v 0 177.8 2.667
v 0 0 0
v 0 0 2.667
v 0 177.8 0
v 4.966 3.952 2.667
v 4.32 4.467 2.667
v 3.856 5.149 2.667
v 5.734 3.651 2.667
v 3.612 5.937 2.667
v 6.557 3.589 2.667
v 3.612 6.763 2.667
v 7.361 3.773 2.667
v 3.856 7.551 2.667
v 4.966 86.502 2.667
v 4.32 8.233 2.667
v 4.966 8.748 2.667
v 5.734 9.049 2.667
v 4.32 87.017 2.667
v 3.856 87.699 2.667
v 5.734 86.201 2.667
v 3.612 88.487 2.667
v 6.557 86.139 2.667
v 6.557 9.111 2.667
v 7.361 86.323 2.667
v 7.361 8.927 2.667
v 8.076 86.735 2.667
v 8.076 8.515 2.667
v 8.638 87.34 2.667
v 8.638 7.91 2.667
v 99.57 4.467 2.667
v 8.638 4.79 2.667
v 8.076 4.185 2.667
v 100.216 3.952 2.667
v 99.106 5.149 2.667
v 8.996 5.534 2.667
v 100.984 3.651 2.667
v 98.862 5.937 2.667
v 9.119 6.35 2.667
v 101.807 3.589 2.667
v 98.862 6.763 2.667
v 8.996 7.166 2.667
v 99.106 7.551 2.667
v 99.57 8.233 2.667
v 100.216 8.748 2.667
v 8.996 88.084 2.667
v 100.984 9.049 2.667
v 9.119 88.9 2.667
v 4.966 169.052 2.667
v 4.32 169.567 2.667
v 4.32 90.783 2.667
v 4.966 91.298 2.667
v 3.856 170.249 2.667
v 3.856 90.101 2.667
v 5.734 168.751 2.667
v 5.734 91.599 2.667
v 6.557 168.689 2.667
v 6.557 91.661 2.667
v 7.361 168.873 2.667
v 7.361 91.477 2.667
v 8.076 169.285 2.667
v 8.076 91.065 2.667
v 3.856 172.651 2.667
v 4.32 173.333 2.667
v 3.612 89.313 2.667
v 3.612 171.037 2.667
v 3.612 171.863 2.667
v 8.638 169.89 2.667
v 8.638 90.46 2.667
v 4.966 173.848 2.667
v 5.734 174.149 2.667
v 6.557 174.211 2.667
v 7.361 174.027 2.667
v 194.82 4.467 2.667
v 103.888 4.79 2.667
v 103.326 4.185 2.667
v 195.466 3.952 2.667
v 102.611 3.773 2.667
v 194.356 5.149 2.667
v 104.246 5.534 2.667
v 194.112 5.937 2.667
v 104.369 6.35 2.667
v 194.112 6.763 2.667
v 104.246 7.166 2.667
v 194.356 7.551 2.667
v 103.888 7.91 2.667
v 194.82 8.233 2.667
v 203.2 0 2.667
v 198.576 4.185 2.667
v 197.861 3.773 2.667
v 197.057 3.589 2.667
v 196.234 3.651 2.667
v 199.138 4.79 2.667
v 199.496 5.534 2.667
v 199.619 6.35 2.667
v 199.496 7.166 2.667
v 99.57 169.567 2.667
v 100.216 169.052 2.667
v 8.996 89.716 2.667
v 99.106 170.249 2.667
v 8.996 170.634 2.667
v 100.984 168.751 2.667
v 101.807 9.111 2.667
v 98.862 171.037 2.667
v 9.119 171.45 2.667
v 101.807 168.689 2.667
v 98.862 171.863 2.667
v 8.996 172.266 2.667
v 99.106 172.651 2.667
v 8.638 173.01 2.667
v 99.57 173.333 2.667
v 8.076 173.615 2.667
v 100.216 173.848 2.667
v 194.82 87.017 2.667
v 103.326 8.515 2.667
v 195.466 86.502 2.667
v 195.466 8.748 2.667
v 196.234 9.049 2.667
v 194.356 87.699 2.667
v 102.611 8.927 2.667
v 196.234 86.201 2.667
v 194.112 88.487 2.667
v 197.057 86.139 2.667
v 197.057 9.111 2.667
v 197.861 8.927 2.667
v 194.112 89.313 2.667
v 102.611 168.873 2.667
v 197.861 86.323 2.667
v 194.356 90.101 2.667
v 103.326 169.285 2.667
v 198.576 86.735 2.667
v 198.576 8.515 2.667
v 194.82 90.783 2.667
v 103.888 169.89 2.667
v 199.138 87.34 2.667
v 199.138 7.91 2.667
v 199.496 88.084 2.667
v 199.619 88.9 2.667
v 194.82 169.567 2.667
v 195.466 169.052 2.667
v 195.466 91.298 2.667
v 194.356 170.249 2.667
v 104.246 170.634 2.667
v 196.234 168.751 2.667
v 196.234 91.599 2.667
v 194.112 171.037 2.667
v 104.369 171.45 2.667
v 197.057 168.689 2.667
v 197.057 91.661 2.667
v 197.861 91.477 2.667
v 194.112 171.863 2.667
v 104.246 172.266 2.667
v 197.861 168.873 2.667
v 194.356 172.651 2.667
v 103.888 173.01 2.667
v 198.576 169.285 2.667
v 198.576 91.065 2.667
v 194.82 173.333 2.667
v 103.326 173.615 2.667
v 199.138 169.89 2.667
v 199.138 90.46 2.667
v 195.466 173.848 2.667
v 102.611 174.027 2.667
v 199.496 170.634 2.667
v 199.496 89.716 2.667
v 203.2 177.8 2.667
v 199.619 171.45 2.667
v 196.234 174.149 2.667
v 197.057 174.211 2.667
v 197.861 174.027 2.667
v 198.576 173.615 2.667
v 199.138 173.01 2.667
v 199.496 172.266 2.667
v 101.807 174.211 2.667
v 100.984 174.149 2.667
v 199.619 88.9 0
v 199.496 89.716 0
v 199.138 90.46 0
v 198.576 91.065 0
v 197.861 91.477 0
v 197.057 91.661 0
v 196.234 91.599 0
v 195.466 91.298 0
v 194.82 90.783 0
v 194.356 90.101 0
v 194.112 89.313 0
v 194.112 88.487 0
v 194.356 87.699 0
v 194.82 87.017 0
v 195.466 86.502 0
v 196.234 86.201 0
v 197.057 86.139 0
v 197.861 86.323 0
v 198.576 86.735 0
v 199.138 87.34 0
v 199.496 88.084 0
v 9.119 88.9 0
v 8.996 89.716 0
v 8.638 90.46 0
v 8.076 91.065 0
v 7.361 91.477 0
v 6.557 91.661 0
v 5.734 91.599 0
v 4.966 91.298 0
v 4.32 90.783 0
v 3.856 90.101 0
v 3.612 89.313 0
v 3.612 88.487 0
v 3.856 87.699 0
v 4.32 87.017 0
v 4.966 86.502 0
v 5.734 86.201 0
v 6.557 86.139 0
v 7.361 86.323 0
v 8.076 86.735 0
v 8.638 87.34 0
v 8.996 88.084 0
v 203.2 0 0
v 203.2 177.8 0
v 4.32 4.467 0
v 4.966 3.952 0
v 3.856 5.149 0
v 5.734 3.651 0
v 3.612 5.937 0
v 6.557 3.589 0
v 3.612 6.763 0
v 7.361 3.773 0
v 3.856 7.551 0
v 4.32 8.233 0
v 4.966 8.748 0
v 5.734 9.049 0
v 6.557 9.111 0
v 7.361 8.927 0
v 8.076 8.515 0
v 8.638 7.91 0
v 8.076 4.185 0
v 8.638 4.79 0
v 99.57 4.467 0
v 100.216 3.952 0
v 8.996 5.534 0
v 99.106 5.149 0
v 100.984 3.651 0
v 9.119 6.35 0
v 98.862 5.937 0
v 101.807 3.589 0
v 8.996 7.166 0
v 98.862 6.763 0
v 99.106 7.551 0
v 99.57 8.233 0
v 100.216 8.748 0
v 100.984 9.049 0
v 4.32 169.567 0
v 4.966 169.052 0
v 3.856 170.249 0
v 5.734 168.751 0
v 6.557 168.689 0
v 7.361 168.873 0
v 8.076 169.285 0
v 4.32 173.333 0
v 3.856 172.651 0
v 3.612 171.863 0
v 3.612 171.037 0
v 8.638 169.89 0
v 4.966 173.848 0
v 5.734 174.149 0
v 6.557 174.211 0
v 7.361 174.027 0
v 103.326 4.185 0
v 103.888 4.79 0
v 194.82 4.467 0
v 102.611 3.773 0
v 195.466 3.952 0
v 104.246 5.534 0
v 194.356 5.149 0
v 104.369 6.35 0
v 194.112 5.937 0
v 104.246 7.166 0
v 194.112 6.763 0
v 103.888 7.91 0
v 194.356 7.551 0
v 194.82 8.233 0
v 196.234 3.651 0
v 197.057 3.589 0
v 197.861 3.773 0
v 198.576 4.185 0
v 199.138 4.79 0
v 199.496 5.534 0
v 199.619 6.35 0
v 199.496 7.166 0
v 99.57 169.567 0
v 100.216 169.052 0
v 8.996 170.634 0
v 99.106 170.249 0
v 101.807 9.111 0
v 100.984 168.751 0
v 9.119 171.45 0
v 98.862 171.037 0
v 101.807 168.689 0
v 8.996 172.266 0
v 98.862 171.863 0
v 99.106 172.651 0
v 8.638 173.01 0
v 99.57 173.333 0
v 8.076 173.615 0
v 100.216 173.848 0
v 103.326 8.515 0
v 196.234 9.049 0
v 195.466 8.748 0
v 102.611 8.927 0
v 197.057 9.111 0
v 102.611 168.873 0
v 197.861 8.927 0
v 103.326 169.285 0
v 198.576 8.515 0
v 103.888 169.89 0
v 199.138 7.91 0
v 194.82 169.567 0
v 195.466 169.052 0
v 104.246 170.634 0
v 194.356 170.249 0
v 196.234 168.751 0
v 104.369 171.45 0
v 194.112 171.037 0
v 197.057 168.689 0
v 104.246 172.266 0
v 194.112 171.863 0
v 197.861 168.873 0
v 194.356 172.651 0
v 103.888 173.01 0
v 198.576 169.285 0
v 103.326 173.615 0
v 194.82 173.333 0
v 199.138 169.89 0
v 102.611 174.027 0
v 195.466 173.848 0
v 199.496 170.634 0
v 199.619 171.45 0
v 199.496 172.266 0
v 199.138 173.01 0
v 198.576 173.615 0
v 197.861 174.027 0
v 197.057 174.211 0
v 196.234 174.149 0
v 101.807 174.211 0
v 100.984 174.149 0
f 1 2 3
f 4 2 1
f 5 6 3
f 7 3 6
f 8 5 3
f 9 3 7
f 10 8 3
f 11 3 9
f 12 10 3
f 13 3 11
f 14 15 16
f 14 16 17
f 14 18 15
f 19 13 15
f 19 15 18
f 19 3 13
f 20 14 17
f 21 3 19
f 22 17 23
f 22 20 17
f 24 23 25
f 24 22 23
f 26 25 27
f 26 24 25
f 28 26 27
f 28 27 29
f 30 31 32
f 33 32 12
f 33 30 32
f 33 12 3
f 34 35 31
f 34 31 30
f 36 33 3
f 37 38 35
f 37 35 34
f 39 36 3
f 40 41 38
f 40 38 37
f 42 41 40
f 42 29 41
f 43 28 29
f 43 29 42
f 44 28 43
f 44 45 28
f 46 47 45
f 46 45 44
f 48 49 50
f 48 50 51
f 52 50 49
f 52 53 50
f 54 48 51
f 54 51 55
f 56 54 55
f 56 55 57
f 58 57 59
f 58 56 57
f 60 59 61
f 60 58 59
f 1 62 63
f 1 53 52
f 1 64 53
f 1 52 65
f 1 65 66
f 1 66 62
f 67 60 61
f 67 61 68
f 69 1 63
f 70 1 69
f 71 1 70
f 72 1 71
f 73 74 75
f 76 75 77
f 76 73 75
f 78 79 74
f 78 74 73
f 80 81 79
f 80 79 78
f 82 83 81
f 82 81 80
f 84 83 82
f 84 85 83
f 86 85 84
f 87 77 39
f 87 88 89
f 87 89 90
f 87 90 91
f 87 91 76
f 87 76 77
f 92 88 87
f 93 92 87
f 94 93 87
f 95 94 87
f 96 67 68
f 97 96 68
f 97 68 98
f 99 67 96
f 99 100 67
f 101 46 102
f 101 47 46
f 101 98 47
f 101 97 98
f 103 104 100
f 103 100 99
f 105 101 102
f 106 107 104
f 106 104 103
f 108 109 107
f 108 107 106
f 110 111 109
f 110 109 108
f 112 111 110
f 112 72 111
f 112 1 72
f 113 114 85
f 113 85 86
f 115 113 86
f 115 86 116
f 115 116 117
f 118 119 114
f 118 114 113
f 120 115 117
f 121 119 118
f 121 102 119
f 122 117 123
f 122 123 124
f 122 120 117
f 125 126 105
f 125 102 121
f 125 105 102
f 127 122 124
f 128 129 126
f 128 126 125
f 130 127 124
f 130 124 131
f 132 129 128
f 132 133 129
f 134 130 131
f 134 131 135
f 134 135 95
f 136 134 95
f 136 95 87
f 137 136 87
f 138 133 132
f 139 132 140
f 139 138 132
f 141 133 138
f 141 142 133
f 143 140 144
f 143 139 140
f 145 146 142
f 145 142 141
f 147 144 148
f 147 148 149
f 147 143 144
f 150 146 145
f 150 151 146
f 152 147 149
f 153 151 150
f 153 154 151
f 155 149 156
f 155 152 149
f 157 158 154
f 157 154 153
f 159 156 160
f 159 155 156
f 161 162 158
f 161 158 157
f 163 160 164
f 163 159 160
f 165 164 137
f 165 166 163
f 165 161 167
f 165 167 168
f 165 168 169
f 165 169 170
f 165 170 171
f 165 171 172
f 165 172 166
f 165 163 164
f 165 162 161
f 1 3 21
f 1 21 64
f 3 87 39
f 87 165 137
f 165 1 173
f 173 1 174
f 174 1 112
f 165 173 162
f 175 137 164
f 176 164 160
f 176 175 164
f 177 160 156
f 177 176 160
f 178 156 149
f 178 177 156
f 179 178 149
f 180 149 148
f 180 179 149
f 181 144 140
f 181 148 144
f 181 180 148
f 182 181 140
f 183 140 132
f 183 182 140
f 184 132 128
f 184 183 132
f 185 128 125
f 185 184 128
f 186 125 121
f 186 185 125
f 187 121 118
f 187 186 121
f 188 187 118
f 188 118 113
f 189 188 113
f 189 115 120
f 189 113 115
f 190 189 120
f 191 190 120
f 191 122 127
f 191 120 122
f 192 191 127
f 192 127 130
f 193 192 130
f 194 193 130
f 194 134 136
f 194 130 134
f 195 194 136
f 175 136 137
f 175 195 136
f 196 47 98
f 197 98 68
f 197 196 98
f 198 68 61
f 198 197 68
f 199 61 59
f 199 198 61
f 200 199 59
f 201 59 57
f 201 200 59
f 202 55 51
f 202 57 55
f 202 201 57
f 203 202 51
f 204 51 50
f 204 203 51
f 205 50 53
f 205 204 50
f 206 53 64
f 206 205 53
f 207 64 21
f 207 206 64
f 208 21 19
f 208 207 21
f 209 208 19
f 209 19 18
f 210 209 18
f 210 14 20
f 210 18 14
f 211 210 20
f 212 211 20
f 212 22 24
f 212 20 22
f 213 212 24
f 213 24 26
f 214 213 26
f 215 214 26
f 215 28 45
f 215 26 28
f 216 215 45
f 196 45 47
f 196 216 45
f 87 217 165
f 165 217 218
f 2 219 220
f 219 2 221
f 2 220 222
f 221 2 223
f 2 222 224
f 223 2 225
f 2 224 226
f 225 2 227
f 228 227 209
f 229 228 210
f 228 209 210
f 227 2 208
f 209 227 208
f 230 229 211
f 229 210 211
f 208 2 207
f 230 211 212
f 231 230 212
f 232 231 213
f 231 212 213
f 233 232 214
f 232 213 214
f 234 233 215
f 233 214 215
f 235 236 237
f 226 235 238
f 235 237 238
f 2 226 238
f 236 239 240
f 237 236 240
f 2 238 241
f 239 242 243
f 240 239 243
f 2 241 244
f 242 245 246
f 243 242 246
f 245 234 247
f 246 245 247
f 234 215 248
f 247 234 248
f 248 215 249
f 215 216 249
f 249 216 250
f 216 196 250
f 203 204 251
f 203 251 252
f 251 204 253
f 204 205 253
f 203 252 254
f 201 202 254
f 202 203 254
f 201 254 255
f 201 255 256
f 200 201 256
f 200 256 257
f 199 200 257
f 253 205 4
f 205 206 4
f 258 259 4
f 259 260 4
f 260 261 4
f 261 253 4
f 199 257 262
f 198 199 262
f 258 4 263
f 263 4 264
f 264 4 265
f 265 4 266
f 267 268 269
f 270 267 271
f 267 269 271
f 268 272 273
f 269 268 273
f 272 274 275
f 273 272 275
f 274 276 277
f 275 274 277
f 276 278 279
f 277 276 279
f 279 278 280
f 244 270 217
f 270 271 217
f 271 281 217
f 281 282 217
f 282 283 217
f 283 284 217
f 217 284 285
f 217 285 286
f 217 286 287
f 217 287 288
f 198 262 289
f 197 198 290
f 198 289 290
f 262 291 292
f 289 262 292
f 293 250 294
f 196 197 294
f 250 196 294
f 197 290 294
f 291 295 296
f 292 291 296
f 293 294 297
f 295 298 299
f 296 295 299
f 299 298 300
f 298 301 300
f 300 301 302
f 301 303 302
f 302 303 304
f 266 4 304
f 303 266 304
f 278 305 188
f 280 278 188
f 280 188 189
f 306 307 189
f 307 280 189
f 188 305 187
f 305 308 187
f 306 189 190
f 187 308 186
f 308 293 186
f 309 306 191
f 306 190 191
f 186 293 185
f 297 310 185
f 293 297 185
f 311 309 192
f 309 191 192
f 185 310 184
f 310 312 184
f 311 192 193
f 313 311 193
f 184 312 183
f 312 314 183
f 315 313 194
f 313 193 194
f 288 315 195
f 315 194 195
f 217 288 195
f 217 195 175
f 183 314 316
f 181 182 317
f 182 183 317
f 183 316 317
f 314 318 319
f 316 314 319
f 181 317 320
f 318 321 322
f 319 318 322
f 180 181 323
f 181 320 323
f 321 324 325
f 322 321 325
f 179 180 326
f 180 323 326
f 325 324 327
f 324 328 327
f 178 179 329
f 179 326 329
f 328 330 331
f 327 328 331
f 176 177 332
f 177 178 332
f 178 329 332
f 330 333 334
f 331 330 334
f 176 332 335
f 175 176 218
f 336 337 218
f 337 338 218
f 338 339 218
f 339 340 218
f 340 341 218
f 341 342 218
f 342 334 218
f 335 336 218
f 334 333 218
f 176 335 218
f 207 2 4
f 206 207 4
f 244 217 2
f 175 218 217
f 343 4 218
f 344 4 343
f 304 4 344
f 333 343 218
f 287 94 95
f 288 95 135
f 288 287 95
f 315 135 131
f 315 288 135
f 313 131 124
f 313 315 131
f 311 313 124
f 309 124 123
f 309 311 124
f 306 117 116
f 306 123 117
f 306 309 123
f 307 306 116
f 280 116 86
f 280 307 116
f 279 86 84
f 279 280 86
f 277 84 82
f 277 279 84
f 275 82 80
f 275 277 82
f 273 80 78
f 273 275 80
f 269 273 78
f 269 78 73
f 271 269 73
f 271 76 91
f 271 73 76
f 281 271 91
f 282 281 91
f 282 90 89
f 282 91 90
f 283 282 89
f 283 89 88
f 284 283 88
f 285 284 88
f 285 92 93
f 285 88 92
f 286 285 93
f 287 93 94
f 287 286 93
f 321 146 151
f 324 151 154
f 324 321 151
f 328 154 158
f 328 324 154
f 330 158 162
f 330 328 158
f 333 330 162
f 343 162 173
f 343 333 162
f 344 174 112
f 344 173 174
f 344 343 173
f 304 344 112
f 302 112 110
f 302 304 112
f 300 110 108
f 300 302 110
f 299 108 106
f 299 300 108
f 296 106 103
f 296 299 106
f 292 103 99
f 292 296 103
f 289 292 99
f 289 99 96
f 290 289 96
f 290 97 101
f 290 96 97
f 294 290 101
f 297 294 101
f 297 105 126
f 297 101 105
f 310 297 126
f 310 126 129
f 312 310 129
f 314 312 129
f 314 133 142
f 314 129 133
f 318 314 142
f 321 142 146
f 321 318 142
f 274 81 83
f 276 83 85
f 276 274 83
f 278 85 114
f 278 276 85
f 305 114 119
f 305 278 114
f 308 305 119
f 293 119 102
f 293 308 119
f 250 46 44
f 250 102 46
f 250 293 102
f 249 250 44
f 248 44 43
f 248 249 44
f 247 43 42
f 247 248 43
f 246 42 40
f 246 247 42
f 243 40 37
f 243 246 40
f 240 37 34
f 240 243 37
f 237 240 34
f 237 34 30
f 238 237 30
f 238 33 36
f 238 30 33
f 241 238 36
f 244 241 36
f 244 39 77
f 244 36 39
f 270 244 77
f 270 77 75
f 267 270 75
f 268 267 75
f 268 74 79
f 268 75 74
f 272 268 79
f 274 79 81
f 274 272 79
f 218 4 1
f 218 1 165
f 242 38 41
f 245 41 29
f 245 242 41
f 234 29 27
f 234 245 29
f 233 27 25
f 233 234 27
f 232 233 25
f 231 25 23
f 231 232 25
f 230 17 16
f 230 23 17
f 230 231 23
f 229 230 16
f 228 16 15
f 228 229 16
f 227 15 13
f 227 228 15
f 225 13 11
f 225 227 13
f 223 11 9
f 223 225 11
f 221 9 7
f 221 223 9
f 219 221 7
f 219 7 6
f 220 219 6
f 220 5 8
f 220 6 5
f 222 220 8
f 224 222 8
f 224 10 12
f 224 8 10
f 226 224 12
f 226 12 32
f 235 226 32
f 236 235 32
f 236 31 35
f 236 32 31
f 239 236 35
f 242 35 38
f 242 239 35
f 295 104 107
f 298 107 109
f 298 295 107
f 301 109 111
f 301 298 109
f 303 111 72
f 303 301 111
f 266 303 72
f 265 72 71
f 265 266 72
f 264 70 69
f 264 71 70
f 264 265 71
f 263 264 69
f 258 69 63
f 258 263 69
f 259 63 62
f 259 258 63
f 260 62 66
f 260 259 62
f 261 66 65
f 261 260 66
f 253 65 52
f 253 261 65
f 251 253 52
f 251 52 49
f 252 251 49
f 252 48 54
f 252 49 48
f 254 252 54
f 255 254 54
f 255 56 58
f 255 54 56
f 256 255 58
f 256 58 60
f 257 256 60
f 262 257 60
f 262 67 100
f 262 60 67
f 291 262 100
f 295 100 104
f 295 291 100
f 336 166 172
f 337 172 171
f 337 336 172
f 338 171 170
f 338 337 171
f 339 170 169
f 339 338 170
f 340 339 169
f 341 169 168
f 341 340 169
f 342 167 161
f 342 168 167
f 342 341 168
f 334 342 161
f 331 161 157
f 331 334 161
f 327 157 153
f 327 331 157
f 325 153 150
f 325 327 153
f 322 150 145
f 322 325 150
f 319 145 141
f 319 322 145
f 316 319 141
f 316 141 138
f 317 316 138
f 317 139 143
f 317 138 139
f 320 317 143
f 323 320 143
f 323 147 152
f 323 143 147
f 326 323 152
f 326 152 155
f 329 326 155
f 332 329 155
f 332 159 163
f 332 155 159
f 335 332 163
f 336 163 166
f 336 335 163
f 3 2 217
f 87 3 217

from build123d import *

# Parameters (mm, degrees)
SKETCH1_W           = 203.2
SKETCH1_H           = 177.8
BOSS_EXTRUDE1_DEPTH = 2.667
SKETCH2_R           = 2.7686
CUT_EXTRUDE1_DEPTH  = 271.018875061


with BuildPart() as part:
    # Sketch1 → Boss-Extrude1 (new body)
    with BuildSketch(Plane.XY):
        with Locations((101.6, 88.9)):
            Rectangle(SKETCH1_W, SKETCH1_H)
    extrude(amount=BOSS_EXTRUDE1_DEPTH)

    # Sketch2 → Cut-Extrude1 (cut, through all)
    with BuildSketch(Plane.XY):
        with Locations((6.35, 6.35)):
            Circle(SKETCH2_R)
        with Locations((101.6, 6.35)):
            Circle(SKETCH2_R)
        with Locations((196.85, 6.35)):
            Circle(SKETCH2_R)
        with Locations((6.35, 88.9)):
            Circle(SKETCH2_R)
        with Locations((196.85, 88.9)):
            Circle(SKETCH2_R)
        with Locations((6.35, 171.45)):
            Circle(SKETCH2_R)
        with Locations((101.6, 171.45)):
            Circle(SKETCH2_R)
        with Locations((196.85, 171.45)):
            Circle(SKETCH2_R)
    extrude(amount=CUT_EXTRUDE1_DEPTH, mode=Mode.SUBTRACT)


solid = part.part
